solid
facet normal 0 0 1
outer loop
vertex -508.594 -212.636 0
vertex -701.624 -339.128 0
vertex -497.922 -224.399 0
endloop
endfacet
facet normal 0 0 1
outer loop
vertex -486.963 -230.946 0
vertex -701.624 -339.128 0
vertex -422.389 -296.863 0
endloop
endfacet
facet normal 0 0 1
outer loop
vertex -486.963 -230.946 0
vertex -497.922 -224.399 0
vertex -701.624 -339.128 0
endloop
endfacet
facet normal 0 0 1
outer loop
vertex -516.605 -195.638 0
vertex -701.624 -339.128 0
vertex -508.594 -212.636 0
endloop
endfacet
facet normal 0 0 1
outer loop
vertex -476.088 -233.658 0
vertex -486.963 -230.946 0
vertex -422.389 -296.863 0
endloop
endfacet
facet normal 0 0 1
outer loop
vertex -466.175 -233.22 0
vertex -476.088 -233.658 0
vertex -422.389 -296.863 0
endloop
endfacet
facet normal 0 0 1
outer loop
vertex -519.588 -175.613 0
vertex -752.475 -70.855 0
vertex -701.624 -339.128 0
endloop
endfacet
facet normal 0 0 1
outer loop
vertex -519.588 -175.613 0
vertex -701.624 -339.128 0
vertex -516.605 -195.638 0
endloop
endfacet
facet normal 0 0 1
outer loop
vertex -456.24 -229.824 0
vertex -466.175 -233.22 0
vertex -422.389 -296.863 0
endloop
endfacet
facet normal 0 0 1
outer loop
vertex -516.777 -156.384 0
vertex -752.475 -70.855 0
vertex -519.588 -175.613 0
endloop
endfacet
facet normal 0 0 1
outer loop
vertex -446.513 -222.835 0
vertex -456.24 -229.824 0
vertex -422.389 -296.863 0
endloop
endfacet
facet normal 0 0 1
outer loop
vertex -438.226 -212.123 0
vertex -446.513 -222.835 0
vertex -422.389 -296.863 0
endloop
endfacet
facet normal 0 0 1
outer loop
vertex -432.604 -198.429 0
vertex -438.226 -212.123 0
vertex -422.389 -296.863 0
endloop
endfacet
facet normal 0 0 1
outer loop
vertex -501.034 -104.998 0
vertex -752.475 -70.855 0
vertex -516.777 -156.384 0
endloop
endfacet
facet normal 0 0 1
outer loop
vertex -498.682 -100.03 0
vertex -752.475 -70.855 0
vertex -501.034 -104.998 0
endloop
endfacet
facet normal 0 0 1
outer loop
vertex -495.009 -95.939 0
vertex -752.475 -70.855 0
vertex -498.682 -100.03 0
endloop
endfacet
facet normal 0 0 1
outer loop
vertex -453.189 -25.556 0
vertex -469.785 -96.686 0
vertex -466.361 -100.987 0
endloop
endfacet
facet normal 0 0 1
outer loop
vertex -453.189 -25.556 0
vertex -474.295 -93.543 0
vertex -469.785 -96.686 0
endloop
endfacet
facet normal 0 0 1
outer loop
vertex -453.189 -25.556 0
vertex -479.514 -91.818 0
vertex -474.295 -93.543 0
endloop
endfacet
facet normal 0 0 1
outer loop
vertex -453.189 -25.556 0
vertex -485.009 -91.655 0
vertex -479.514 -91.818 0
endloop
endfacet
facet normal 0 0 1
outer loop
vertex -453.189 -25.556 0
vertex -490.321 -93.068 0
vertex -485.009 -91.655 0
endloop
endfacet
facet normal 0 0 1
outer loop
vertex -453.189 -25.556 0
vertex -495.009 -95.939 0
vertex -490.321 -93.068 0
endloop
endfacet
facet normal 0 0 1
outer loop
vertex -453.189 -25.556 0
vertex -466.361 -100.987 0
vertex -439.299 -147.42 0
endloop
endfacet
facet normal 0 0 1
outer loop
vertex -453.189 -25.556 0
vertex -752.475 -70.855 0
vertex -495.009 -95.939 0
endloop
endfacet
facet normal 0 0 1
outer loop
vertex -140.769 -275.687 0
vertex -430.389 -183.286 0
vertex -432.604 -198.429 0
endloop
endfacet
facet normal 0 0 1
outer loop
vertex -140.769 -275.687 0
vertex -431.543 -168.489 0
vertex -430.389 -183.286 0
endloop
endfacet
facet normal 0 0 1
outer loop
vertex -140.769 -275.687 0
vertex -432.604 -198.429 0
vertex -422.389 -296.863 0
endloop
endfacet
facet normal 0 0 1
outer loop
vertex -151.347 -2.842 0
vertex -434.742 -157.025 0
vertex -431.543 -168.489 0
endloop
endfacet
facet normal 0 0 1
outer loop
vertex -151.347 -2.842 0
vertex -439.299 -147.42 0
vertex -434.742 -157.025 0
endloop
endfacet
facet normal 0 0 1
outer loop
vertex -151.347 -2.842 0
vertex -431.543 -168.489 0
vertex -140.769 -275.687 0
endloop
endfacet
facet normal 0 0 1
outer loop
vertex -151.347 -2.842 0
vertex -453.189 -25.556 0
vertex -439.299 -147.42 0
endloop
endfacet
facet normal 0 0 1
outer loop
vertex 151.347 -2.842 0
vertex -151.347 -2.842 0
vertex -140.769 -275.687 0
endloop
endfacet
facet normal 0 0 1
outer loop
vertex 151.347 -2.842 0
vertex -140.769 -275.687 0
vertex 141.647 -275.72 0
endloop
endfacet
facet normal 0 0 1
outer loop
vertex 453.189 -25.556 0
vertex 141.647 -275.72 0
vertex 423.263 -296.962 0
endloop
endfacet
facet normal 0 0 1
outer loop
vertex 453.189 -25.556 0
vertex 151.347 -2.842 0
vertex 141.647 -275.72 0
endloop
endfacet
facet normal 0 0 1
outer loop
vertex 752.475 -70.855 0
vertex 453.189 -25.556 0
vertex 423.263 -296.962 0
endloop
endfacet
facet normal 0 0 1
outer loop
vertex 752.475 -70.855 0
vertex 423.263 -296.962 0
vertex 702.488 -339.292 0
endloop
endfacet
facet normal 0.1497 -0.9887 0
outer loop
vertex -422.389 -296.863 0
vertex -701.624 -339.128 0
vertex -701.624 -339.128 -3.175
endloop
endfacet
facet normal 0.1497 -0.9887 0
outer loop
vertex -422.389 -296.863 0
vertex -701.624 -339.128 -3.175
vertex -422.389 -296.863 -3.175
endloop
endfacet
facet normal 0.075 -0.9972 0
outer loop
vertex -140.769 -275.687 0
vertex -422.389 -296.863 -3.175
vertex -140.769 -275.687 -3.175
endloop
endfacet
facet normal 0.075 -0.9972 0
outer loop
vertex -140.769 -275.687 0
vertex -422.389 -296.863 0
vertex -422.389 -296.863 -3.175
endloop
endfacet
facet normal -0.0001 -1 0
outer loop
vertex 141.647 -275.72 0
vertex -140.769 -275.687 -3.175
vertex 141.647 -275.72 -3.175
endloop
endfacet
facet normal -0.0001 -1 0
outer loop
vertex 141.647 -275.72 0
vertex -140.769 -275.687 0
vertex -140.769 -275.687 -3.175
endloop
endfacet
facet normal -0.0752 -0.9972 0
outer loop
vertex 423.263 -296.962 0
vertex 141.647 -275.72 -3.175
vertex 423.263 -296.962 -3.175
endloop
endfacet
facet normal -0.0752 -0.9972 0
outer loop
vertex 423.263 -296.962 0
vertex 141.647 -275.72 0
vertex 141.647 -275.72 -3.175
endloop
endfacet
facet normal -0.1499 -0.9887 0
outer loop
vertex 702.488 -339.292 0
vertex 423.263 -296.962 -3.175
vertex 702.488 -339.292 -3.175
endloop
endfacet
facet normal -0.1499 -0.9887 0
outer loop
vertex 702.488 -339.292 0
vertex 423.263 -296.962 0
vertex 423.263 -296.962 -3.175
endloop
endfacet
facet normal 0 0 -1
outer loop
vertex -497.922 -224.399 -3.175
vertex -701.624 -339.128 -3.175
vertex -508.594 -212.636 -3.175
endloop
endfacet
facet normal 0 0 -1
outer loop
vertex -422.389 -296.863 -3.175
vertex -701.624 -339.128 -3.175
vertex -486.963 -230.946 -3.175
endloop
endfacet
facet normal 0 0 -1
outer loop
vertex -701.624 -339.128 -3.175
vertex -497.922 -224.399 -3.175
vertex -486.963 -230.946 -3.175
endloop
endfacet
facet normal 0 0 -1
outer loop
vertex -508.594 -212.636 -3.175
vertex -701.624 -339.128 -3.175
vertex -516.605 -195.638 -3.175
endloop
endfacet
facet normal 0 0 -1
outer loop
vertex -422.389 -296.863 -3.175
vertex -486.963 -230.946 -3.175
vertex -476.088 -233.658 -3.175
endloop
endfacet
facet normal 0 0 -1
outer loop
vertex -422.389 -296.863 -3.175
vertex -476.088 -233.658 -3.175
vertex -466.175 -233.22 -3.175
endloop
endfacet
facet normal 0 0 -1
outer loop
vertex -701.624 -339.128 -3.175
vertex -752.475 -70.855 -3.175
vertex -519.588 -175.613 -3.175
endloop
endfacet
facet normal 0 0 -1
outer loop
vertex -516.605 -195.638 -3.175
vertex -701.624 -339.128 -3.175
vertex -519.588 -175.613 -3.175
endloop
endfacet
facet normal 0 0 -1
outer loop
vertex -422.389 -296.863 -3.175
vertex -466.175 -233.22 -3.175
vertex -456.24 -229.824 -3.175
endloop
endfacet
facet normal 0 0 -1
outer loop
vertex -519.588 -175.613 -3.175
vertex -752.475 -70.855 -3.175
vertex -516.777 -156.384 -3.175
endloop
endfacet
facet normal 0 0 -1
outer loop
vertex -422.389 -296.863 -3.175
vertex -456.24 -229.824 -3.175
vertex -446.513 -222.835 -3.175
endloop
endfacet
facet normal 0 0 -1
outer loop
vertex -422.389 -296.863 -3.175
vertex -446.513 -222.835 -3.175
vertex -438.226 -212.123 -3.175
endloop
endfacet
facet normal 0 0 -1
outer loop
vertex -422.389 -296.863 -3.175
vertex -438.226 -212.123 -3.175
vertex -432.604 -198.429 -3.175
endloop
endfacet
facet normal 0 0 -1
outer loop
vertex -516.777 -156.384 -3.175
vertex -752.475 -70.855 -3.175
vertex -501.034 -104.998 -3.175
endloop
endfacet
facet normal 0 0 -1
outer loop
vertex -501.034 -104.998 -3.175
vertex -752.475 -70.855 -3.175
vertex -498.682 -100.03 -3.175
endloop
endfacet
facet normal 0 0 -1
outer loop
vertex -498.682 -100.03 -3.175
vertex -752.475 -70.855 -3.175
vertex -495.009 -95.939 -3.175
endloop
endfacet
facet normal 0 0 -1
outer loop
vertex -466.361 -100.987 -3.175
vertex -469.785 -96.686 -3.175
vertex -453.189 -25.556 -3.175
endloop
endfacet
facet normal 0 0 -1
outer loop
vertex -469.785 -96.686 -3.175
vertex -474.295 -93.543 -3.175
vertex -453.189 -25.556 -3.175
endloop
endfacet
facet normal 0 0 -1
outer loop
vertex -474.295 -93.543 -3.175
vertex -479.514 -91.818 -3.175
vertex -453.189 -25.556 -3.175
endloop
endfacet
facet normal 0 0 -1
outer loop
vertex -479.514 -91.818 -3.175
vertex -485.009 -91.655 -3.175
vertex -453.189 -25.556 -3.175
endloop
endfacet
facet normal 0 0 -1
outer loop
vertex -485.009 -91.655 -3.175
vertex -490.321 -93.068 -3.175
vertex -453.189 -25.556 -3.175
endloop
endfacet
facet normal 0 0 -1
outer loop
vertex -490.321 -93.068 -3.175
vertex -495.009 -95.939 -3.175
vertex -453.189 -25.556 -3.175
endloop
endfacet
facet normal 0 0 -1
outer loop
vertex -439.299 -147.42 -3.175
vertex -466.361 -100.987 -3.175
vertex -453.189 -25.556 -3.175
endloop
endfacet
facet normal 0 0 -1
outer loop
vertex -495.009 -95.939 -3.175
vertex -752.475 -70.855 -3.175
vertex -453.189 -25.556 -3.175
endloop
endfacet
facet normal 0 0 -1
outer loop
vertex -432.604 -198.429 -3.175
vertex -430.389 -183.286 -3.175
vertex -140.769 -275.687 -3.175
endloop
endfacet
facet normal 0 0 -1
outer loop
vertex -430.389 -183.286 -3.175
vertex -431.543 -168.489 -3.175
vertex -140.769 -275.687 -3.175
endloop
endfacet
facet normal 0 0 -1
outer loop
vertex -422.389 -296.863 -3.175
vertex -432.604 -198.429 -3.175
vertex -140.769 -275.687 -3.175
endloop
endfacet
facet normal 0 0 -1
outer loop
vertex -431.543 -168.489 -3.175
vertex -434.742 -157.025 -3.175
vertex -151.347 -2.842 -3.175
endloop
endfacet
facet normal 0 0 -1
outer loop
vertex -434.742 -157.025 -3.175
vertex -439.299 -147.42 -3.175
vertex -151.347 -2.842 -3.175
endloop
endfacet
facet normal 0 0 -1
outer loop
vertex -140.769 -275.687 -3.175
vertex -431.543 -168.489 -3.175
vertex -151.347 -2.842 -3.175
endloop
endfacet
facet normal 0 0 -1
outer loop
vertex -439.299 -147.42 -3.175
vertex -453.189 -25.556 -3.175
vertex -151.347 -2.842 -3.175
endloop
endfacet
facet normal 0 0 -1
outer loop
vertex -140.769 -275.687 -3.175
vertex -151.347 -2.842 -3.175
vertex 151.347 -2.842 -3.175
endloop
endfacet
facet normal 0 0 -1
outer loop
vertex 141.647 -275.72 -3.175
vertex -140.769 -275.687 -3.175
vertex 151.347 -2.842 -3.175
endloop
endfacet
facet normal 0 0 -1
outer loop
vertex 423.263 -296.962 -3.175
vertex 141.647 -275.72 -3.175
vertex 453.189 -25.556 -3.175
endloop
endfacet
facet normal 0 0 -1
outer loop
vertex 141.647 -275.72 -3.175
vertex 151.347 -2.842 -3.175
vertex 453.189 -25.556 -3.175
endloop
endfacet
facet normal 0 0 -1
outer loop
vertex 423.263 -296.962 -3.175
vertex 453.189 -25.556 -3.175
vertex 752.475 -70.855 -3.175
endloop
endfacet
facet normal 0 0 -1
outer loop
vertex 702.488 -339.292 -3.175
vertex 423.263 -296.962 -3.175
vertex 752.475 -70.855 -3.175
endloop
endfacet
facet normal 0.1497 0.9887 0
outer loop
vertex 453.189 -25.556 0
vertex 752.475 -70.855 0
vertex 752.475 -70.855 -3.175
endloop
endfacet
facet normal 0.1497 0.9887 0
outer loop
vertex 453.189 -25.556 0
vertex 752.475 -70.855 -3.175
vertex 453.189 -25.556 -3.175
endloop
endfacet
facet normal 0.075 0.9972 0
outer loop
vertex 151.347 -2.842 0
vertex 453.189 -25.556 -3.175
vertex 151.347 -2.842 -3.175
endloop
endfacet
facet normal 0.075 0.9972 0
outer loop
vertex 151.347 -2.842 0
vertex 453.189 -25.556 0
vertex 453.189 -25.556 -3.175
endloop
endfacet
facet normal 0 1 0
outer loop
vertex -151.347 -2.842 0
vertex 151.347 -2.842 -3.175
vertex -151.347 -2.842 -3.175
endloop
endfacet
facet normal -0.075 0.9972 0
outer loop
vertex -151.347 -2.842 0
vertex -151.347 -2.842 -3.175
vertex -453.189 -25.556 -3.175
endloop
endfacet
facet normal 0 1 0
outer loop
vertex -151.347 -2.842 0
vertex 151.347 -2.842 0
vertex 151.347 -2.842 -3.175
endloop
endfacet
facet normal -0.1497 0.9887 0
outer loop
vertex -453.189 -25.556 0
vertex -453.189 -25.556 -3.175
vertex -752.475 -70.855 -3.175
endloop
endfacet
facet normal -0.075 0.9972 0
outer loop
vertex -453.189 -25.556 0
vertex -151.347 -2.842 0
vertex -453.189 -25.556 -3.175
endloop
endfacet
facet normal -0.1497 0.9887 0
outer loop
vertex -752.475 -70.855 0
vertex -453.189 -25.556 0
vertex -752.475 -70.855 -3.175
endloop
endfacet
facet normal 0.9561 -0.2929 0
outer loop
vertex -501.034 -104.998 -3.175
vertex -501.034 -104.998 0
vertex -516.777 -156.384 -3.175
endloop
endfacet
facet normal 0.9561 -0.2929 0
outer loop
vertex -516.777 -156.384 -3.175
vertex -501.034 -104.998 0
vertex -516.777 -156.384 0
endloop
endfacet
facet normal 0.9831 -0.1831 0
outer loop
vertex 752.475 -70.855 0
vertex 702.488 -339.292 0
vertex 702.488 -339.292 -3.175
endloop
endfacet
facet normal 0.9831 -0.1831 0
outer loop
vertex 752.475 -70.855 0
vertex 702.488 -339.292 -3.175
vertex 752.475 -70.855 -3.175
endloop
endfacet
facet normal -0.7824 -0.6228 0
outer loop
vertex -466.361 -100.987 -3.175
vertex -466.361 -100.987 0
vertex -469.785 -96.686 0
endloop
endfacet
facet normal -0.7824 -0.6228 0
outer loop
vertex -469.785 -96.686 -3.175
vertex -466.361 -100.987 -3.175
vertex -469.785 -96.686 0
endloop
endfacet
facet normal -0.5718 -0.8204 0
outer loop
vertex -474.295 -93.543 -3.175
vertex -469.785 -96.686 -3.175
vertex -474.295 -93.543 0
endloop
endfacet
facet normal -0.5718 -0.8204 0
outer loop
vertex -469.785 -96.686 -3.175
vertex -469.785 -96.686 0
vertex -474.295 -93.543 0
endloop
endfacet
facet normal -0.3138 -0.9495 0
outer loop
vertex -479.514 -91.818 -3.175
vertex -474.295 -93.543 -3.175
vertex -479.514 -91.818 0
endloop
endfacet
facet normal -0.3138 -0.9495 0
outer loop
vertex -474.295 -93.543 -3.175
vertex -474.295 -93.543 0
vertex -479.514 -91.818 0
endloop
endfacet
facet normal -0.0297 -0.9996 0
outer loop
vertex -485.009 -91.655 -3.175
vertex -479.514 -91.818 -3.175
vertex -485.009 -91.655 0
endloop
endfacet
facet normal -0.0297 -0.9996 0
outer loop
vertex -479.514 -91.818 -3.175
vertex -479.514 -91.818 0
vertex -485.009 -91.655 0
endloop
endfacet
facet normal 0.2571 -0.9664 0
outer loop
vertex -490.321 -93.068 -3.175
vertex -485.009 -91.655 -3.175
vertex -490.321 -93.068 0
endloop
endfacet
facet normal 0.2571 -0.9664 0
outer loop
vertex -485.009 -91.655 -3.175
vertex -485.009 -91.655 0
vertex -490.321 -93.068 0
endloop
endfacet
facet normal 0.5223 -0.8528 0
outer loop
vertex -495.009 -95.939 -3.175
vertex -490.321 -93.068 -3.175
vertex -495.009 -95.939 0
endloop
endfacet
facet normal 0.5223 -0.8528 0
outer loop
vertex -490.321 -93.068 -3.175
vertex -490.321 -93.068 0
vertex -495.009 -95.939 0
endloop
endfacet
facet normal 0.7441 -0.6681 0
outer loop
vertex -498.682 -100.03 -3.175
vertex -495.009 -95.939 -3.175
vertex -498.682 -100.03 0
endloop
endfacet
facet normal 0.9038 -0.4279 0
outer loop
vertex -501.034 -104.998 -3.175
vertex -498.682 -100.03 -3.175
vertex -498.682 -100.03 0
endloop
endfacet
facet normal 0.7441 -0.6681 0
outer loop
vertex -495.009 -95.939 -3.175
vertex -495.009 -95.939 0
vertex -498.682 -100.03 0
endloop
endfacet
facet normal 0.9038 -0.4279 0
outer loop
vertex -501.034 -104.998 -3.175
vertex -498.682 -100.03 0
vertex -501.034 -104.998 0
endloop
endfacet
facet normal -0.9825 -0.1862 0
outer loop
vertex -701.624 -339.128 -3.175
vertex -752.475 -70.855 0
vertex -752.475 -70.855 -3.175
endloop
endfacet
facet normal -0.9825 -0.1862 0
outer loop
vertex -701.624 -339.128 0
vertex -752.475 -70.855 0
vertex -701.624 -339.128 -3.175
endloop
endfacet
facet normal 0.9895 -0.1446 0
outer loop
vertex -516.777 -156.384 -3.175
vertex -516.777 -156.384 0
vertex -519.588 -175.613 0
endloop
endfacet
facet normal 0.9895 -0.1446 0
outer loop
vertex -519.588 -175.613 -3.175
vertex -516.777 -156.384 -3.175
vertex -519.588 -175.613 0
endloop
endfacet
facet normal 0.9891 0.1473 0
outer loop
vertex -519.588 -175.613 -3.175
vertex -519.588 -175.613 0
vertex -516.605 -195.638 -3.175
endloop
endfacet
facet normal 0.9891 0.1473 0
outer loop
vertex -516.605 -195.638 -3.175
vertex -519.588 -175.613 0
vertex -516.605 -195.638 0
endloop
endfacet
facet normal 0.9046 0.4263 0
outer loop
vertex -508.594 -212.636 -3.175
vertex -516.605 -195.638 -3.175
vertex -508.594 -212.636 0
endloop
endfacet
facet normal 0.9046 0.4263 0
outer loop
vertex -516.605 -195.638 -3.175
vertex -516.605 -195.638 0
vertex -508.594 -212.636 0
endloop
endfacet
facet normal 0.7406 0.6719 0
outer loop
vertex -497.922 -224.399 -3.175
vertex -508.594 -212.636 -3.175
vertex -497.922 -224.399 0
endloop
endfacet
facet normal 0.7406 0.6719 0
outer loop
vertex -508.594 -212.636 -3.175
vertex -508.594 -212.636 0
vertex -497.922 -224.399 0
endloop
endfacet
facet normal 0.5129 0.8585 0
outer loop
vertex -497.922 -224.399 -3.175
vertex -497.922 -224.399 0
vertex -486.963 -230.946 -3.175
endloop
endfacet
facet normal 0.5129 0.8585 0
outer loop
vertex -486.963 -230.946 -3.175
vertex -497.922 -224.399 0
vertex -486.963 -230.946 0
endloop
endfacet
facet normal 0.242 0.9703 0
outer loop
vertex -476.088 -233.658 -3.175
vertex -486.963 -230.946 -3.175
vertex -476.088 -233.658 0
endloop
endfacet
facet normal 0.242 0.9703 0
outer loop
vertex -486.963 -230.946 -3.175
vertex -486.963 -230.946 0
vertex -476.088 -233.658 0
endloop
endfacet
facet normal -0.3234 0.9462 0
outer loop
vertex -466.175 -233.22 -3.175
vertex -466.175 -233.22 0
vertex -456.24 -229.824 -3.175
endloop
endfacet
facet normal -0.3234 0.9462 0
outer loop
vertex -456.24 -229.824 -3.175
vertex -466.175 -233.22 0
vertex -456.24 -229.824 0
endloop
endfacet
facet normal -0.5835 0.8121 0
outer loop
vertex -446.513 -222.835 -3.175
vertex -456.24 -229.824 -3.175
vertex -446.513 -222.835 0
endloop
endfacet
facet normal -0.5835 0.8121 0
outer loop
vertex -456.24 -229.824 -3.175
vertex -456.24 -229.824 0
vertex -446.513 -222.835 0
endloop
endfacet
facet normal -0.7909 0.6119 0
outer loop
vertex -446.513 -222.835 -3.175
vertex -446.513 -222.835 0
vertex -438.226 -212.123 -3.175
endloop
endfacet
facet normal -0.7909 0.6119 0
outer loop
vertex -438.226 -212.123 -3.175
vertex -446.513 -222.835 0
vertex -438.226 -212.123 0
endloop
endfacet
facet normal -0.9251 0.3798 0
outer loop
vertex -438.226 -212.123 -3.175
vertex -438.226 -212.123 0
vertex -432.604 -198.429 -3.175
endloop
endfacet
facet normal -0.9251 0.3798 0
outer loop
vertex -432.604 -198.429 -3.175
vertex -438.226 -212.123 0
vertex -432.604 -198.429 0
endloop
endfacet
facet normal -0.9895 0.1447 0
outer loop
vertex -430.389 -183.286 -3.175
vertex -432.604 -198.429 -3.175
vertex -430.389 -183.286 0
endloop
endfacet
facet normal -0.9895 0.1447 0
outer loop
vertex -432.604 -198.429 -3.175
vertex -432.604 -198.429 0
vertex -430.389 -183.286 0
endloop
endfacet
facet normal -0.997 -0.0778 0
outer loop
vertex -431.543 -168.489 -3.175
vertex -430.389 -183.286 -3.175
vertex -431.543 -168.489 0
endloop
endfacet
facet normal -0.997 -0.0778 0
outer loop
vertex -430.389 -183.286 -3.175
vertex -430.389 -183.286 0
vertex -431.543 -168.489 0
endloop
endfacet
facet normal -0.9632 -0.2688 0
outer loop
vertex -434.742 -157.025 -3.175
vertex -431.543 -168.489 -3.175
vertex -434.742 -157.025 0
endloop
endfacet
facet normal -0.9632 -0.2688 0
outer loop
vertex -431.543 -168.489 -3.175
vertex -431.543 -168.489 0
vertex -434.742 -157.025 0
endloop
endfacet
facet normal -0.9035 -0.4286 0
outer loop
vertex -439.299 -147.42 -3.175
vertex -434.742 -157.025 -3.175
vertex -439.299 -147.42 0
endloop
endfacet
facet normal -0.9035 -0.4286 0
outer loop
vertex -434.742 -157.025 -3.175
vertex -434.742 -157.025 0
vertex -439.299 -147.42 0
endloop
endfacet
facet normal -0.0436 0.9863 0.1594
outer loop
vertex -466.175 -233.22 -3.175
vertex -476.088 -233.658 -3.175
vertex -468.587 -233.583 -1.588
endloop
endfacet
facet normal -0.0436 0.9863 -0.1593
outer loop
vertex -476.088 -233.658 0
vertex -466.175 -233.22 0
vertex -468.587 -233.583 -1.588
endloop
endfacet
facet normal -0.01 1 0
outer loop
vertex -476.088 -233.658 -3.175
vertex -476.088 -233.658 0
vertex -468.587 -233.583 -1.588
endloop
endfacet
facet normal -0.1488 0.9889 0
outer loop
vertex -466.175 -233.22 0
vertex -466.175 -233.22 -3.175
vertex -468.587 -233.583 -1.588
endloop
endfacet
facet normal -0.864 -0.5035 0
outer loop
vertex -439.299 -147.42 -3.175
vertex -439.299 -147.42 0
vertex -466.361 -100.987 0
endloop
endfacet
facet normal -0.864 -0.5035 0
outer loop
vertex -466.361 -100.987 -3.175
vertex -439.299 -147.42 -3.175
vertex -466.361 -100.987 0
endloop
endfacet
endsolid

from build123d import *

# Parameters (mm, degrees)
BASE_EXTRUDE_DEPTH = 3.175


with BuildPart() as part:
    # Sketch1 → Base-Extrude (new body)
    with BuildSketch(Plane.XY):
        with BuildLine():
            Line((-752.475, -70.85475791), (-701.6242, -339.127966514))
            ThreePointArc((-701.6242, -339.127966514), (0.43953811, -273.050025704), (702.4878, -339.292192091))
            Line((702.4878, -339.292192091), (752.475, -70.85475791))
            ThreePointArc((752.475, -70.85475791), (0, 0), (-752.475, -70.85475791))
        make_face()
        with BuildLine():
            Line((-501.033720833, -104.998443764), (-516.777000766, -156.384056801))
            add(Edge.make_bspline(
                [(-516.777000766, -156.384056801), (-543.069216838, -242.201094082), (-468.587308293, -233.583243234), (-394.105399749, -224.965392385), (-439.29934176, -147.419585798)],
                knots=[1.070267673, 1.070267673, 1.070267673, 3.141592654, 3.141592654, 5.212917634, 5.212917634, 5.212917634], degree=2, weights=[1, 0.50995617, 1, 0.50995617, 1]))
            Line((-439.29934176, -147.419585798), (-466.360616413, -100.986628705))
            ThreePointArc((-466.360616413, -100.986628705), (-485.00895367, -91.655109348), (-501.033720833, -104.998443764))
        make_face(mode=Mode.SUBTRACT)
    extrude(amount=-BASE_EXTRUDE_DEPTH)


solid = part.part
